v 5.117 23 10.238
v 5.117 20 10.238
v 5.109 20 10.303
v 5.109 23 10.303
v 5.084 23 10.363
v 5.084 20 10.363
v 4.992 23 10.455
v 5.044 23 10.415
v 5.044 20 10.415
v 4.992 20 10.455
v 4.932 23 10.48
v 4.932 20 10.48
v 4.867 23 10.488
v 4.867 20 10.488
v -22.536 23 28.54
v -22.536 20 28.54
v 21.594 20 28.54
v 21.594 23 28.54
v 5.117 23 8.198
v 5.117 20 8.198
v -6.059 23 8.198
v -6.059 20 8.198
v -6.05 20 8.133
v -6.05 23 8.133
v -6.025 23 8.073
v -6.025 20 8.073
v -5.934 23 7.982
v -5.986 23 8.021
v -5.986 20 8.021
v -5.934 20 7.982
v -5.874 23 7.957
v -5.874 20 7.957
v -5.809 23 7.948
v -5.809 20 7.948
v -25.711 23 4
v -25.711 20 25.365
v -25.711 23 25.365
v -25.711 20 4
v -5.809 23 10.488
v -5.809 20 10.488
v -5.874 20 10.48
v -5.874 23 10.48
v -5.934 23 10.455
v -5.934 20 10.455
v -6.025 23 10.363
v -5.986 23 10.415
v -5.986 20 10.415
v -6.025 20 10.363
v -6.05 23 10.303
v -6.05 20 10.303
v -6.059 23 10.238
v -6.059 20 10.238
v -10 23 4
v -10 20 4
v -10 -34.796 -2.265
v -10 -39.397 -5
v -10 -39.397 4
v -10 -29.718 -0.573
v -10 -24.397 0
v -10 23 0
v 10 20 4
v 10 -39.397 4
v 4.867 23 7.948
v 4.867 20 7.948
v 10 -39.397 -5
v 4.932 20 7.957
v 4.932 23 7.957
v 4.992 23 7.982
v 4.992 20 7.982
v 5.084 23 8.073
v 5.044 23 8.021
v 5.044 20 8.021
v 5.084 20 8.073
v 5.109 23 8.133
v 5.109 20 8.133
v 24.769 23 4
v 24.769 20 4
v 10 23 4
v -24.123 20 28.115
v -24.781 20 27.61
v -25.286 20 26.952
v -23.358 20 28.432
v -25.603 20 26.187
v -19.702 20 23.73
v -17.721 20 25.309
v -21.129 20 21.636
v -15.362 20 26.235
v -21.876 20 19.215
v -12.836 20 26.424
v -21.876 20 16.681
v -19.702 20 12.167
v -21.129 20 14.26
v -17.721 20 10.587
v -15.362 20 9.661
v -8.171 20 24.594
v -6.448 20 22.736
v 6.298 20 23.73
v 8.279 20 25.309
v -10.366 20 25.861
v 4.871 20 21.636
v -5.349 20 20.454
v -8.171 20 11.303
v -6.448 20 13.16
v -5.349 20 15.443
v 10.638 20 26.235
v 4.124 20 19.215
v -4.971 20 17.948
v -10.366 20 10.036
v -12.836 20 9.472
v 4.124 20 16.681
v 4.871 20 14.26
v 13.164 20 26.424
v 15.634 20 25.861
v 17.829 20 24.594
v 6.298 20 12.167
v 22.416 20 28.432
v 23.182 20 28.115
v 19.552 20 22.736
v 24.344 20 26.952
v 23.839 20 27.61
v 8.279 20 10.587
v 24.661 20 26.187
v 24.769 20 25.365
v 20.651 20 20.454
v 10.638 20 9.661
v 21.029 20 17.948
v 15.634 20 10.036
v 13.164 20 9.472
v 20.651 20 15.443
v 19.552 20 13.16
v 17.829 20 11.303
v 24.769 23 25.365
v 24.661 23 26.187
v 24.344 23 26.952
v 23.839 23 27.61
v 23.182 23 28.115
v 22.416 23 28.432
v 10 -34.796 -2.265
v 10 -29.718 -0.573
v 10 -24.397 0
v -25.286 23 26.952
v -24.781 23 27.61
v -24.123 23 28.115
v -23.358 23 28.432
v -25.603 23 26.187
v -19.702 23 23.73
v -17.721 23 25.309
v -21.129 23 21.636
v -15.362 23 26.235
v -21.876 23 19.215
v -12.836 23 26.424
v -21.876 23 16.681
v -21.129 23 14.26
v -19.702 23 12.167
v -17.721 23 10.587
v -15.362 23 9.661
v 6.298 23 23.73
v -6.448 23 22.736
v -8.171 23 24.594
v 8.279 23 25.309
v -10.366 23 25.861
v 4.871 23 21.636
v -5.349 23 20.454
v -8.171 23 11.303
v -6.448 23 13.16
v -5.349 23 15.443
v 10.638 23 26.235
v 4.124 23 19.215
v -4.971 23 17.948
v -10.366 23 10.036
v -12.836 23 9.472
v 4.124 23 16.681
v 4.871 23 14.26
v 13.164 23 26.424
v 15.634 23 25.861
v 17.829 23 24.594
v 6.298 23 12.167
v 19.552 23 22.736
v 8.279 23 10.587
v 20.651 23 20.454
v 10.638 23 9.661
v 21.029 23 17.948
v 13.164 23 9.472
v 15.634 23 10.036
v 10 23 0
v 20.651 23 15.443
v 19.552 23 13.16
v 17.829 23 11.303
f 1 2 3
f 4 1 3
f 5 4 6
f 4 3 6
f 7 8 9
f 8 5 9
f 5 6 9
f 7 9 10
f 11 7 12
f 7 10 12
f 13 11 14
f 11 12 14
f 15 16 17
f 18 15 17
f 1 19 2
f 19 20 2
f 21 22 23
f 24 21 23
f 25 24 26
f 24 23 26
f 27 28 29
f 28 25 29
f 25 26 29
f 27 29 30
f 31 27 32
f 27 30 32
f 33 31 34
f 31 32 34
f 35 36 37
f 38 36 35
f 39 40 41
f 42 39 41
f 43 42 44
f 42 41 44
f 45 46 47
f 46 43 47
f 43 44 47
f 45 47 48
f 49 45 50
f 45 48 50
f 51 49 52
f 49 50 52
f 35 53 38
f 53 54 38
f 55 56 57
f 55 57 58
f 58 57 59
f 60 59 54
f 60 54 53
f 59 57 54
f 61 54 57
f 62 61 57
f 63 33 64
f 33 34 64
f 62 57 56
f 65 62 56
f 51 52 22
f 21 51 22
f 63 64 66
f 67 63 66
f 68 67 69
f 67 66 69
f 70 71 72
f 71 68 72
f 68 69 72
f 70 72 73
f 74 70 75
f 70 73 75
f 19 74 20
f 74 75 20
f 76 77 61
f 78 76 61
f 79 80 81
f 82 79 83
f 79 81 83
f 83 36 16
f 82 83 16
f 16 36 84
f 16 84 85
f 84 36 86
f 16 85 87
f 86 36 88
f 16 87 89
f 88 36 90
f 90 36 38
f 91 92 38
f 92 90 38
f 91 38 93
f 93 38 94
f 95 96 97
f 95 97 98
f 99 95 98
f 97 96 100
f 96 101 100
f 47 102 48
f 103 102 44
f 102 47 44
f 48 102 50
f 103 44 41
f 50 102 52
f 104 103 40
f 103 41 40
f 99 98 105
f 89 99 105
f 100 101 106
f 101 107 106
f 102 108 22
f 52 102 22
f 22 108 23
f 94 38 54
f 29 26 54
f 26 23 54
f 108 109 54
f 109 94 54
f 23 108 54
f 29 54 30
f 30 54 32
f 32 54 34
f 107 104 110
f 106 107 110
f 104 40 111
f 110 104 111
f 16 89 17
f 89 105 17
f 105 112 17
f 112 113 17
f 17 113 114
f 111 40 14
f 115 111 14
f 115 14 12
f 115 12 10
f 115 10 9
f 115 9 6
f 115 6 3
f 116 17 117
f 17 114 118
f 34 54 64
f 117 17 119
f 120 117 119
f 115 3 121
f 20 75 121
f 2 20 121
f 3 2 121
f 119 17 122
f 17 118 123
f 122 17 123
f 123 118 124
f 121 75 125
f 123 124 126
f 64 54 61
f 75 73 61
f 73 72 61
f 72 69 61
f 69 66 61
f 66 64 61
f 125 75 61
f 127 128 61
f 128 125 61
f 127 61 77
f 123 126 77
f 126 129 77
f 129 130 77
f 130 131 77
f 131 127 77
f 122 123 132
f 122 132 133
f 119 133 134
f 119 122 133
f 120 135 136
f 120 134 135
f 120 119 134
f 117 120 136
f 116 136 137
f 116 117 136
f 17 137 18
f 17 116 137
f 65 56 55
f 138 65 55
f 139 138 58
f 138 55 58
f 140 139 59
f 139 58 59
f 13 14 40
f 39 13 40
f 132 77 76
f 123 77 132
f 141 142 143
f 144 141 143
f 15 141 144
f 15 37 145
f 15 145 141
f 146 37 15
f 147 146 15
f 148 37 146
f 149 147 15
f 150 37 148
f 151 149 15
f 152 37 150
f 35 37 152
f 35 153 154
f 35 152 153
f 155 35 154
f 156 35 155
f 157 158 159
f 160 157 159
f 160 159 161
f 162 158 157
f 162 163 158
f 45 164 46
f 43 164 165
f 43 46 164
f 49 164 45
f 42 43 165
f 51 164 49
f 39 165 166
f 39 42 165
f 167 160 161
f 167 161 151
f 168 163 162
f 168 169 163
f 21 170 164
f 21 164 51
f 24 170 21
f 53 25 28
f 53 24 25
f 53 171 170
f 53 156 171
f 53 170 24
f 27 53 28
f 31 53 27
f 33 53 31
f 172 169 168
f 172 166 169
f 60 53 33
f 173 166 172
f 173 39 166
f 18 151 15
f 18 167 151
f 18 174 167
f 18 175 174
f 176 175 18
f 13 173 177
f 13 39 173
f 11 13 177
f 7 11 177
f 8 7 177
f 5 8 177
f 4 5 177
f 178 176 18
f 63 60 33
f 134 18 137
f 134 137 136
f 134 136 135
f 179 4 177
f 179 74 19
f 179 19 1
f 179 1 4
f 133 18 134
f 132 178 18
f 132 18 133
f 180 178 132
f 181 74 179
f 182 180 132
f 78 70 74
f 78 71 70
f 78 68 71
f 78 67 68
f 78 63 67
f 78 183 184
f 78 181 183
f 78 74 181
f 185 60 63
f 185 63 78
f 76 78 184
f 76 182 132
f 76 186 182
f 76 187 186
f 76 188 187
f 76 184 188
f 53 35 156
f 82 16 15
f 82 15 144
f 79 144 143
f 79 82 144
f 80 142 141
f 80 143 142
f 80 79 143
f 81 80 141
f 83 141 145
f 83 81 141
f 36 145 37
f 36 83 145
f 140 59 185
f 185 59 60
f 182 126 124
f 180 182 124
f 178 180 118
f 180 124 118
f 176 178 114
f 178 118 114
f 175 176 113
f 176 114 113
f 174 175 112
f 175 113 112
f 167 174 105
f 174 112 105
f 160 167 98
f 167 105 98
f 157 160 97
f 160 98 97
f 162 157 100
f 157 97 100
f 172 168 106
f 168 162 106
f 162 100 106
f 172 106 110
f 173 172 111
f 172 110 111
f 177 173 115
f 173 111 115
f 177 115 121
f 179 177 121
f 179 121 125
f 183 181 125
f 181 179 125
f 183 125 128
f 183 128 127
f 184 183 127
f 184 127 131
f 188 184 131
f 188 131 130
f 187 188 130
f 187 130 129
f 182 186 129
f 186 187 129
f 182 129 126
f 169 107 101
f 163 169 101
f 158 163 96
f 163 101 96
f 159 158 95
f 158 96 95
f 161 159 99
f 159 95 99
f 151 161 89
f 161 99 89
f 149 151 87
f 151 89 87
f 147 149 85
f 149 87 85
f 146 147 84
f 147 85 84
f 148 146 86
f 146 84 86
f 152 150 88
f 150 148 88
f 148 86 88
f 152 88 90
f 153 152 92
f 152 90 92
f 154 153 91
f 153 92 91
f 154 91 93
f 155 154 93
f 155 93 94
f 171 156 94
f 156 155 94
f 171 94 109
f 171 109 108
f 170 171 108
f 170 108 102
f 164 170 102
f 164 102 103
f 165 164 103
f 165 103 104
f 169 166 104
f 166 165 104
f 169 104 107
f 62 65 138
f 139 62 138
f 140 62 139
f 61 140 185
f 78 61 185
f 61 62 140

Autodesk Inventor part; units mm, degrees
ref_plane "YZ Plane" through (0, 0, 0) normal (1, 0, 0) x (0, 1, 0)
ref_plane "XZ Plane" through (0, 0, 0) normal (0, 1, 0) x (-1, 0, 0)
ref_plane "XY Plane" through (0, 0, 0) normal (0, 0, 1) x (1, 0, 0)
sketch "Sketch1" plane through (0, 0, 0) normal (1, 0, 0) x (0, 1, 0)
  arc A0 (-24.3967, 0) -> (-49.3967, -25) centre (-24.3967, -25) ccw projected
  line L0 (-10.5765, 0) -> (-24.3967, 0) projected
  line L1 (-10.5765, 0) -> (63.7352, 0) projected
  line L2 (-24.3967, 0) -> (-39.3967, 0)
  line L3 (-39.3967, 0) -> (-39.3967, -5)
  line L4 (-39.3967, 0) -> (-3.4641, 0)
  line L5 (0, 4) -> (-39.3967, 4)
  line L6 (-39.3967, 4) -> (-39.3967, 0)
  line L7 (0, 4) -> (20, 4)
  line L8 (20, 4) -> (20, 0)
  line L9 (-3.4641, 0) -> (20, 0)
  point P0 (0, 0)
  dimension "d0" = 15
  dimension "d8" = 20
  dimension "d12" = 4
extrude "Extrusion1" add sketch "Sketch1" along normal mid plane 20
sketch "Sketch4" plane through (-10, 20, 4) normal (0, 1, 0) x (1, 0, 0)
  line L0 (4.1911, -3.9481) -> (14.8671, -3.9481)
  line L1 (14.8671, -6.4881) -> (4.1911, -6.4881)
  line L2 (0, 0) -> (20, 0)
  line L3 (-12.5359, -24.54) -> (31.5941, -24.54)
  line L4 (34.7691, 0) -> (-15.7109, 0)
  line L5 (-15.7109, 0) -> (34.7691, 0)
  line L6 (3.9411, -6.2381) -> (3.9411, -4.1981)
  arc A0 (3.9411, -6.2381) -> (4.1911, -6.4881) centre (4.1911, -6.2381) ccw
  arc A1 (4.1911, -3.9481) -> (3.9411, -4.1981) centre (4.1911, -4.1981) ccw
  line L7 (0, 4) -> (0, 0)
  circle A2 centre (-3.4709, -13.9481) radius 8.5
  arc A3 (-15.7109, -21.365) -> (-12.5359, -24.54) centre (-12.5359, -21.365) ccw
  line L8 (-15.7109, -21.365) -> (-15.7109, 0)
  arc A4 (31.5941, -24.54) -> (34.7691, -21.365) centre (31.5941, -21.365) ccw
  line L9 (34.7691, 0) -> (34.7691, -21.365)
  line L10 (20, 0) -> (20, 4)
  line L11 (20, 4) -> (20, 2)
  arc A5 (14.8671, -6.4881) -> (15.1171, -6.2381) centre (14.8671, -6.2381) ccw
  arc A6 (15.1171, -4.1981) -> (14.8671, -3.9481) centre (14.8671, -4.1981) ccw
  circle A7 centre (22.5291, -13.9481) radius 8.5
  line L12 (15.1171, -4.1981) -> (15.1171, -6.2381)
  line L13 (0, 2) -> (0, 0)
  line L14 (0, 0) -> (20, 0)
  line L15 (20, 0) -> (20, 2)
  line L16 (0, 0) -> (20, 0) projected
  line L17 (20, 4) -> (20, 0) projected
  line L18 (20, 4) -> (0, 4) projected
  line L19 (0, 0) -> (0, 4) projected
  point P0 (10, 4)
  point P1 (10, 2)
  point P2 (10, 4)
  point P3 (10, 0)
  point P4 (10, 0)
  point P5 (24.7691, -1.4081)
  point P6 (10, 4)
  dimension "d9" = 4
extrude "Extrusion3" add sketch "Sketch4" along normal blind 3
properties part number "SensorMount"
